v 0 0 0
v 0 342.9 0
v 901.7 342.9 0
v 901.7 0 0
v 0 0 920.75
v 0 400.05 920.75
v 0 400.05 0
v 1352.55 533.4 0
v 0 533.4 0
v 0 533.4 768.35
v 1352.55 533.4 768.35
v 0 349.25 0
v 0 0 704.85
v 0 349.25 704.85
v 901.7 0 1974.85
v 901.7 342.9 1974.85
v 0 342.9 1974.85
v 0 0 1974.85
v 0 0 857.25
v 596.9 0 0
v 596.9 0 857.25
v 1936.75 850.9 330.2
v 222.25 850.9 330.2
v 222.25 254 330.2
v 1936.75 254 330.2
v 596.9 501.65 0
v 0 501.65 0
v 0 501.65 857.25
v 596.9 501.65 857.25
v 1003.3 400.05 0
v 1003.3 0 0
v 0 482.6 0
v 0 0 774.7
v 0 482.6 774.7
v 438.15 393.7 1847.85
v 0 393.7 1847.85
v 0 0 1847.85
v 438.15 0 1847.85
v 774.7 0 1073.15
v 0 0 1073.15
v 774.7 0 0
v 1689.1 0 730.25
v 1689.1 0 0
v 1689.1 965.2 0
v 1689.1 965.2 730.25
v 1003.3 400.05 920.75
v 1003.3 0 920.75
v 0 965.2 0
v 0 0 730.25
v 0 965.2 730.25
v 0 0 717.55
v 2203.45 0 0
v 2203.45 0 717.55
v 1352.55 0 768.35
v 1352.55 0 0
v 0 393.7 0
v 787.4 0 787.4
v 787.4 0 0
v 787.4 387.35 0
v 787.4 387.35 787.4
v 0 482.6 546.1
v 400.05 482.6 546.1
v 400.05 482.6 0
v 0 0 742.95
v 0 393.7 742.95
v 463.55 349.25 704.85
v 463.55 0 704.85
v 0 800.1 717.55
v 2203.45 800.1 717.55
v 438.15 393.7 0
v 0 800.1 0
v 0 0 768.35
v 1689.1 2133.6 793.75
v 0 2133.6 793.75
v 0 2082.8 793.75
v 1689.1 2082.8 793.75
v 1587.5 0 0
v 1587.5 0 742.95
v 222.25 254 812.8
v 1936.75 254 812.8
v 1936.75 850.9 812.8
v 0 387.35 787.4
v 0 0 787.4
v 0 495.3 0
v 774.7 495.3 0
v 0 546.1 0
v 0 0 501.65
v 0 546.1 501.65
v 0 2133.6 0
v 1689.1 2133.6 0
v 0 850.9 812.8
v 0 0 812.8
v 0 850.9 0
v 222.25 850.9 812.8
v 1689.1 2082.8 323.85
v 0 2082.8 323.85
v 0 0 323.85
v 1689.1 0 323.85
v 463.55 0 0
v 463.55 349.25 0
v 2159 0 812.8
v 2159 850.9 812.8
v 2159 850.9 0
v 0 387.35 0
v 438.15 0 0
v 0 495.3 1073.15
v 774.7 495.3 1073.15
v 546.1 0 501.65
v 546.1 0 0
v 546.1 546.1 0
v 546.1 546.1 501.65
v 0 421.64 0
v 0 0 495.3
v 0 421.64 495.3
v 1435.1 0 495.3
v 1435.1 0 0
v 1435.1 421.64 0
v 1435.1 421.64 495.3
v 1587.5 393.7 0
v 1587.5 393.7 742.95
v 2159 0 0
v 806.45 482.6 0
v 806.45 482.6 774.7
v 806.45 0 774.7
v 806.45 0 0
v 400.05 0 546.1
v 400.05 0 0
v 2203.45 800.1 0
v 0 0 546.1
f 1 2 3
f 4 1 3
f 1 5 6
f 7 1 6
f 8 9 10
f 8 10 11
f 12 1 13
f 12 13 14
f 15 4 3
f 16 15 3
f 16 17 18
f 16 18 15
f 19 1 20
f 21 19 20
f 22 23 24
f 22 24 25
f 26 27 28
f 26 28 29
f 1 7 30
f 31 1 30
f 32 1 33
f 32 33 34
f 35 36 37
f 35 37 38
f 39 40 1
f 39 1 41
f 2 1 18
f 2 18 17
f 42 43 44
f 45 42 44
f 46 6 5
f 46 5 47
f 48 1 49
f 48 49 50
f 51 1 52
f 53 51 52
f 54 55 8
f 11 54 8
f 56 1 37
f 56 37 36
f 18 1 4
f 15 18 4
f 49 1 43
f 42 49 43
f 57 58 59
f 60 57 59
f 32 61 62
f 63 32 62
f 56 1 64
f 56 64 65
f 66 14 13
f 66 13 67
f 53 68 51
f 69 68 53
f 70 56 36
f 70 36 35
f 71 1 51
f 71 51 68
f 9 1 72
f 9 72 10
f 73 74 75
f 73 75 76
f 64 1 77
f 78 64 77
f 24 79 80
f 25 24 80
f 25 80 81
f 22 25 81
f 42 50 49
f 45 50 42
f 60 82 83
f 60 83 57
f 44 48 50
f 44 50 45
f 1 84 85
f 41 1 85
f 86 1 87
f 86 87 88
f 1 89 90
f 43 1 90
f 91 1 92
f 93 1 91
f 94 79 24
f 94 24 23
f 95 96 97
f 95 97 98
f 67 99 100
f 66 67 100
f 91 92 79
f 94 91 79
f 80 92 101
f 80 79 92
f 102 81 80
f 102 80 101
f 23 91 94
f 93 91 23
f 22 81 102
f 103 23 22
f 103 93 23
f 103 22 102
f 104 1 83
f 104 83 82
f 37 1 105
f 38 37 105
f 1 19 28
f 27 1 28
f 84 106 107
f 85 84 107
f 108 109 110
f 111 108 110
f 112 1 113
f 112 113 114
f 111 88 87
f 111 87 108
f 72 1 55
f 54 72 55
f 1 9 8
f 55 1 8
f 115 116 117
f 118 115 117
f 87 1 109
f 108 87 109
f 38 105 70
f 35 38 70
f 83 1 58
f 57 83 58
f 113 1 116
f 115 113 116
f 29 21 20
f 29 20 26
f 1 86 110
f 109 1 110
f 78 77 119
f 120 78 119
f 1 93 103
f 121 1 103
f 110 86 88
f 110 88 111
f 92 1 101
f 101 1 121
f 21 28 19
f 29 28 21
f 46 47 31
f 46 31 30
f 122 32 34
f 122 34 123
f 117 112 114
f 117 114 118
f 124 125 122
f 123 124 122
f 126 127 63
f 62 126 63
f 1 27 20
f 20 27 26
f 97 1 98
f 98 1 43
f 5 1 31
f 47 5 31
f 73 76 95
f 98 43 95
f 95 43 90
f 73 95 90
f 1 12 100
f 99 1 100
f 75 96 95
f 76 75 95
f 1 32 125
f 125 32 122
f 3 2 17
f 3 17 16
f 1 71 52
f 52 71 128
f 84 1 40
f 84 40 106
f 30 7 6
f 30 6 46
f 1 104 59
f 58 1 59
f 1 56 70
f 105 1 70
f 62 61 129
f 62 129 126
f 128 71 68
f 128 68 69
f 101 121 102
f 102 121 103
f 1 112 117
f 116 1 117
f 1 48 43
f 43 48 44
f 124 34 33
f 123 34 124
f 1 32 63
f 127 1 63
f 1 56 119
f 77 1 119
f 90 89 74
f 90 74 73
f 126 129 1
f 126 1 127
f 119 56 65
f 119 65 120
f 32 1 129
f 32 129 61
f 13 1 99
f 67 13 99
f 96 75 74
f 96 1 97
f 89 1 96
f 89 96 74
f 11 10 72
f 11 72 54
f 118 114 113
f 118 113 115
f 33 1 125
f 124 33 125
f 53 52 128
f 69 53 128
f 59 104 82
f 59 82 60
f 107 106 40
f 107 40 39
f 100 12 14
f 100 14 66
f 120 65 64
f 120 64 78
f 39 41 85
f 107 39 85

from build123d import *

# Parameters (mm, degrees)
F0_W      = 774.7
F0_H      = 495.3
F1_DEPTH  = 1073.15
F2_W      = 901.7
F2_H      = 342.9
F3_DEPTH  = 1974.85
F4_W      = 1689.1
F4_H      = 965.2
F5_DEPTH  = 730.25
F6_W      = 1587.5
F6_H      = 393.7
F7_DEPTH  = 742.95
F8_W      = 2159
F8_H      = 850.9
F9_DEPTH  = 812.8
F10_W     = 1714.5
F10_H     = 596.9
F11_DEPTH = 482.6
F12_W     = 1435.1
F12_H     = 421.64
F13_DEPTH = 495.3
F14_W     = 1003.3
F14_H     = 400.05
F15_DEPTH = 920.75
F16_W     = 596.9
F16_H     = 501.65
F17_DEPTH = 857.25
F18_W     = 438.15
F18_H     = 393.7
F19_DEPTH = 1847.85
F20_W     = 1689.1
F20_H     = 2133.6
F21_DEPTH = 323.85
F22_W     = 1689.1
F22_H     = 50.8
F23_DEPTH = 469.9
F24_W     = 806.45
F24_H     = 482.6
F25_DEPTH = 774.7
F26_W     = 400.05
F26_H     = 482.6
F27_DEPTH = 546.1
F28_W     = 463.55
F28_H     = 349.25
F29_DEPTH = 704.85
F30_W     = 1352.55
F30_H     = 533.4
F31_DEPTH = 768.35
F32_W     = 2203.45
F32_H     = 800.1
F33_DEPTH = 717.55
F34_W     = 787.4
F34_H     = 387.35
F35_DEPTH = 787.4
F36_W     = 546.1
F36_H     = 546.1
F37_DEPTH = 501.65


with BuildPart() as f1:
    # F0 (on Top) → F1 (new body)
    with BuildSketch(Plane.XY):
        with Locations((387.35, 247.65)):
            Rectangle(F0_W, F0_H)
    extrude(amount=F1_DEPTH)


with BuildPart() as f3:
    # F2 (on Top) → F3 (new body)
    with BuildSketch(Plane.XY):
        with Locations((450.85, 171.45)):
            Rectangle(F2_W, F2_H)
    extrude(amount=F3_DEPTH)


with BuildPart() as f5:
    # F4 (on Top) → F5 (new body)
    with BuildSketch(Plane.XY):
        with Locations((844.55, 482.6)):
            Rectangle(F4_W, F4_H)
    extrude(amount=F5_DEPTH)


with BuildPart() as f7:
    # F6 (on Top) → F7 (new body)
    with BuildSketch(Plane.XY):
        with Locations((793.75, 196.85)):
            Rectangle(F6_W, F6_H)
    extrude(amount=F7_DEPTH)


with BuildPart() as f9:
    # F8 (on Top) → F9 (new body)
    with BuildSketch(Plane.XY):
        with Locations((1079.5, 425.45)):
            Rectangle(F8_W, F8_H)
    extrude(amount=F9_DEPTH)

    # F10 (on face) → F11 (cut)
    with BuildSketch(Plane.XY.offset(812.8)):
        with Locations((1079.5, 552.45)):
            Rectangle(F10_W, F10_H)
    extrude(amount=-F11_DEPTH, mode=Mode.SUBTRACT)


with BuildPart() as f13:
    # F12 (on Top) → F13 (new body)
    with BuildSketch(Plane.XY):
        with Locations((717.55, 210.82)):
            Rectangle(F12_W, F12_H)
    extrude(amount=F13_DEPTH)


with BuildPart() as f15:
    # F14 (on Top) → F15 (new body)
    with BuildSketch(Plane.XY):
        with Locations((501.65, 200.025)):
            Rectangle(F14_W, F14_H)
    extrude(amount=F15_DEPTH)


with BuildPart() as f17:
    # F16 (on Top) → F17 (new body)
    with BuildSketch(Plane.XY):
        with Locations((298.45, 250.825)):
            Rectangle(F16_W, F16_H)
    extrude(amount=F17_DEPTH)


with BuildPart() as f19:
    # F18 (on Top) → F19 (new body)
    with BuildSketch(Plane.XY):
        with Locations((219.075, 196.85)):
            Rectangle(F18_W, F18_H)
    extrude(amount=F19_DEPTH)


with BuildPart() as f21:
    # F20 (on Top) → F21 (new body)
    with BuildSketch(Plane.XY):
        with Locations((844.55, 1066.8)):
            Rectangle(F20_W, F20_H)
    extrude(amount=F21_DEPTH)

    # F22 (on face) → F23 (join)
    with BuildSketch(Plane.XY.offset(323.85)):
        with Locations((844.55, 2108.2)):
            Rectangle(F22_W, F22_H)
    extrude(amount=F23_DEPTH)


with BuildPart() as f25:
    # F24 (on Top) → F25 (new body)
    with BuildSketch(Plane.XY):
        with Locations((403.225, 241.3)):
            Rectangle(F24_W, F24_H)
    extrude(amount=F25_DEPTH)


with BuildPart() as f27:
    # F26 (on Top) → F27 (new body)
    with BuildSketch(Plane.XY):
        with Locations((200.025, 241.3)):
            Rectangle(F26_W, F26_H)
    extrude(amount=F27_DEPTH)


with BuildPart() as f29:
    # F28 (on Top) → F29 (new body)
    with BuildSketch(Plane.XY):
        with Locations((231.775, 174.625)):
            Rectangle(F28_W, F28_H)
    extrude(amount=F29_DEPTH)


with BuildPart() as f31:
    # F30 (on Top) → F31 (new body)
    with BuildSketch(Plane.XY):
        with Locations((676.275, 266.7)):
            Rectangle(F30_W, F30_H)
    extrude(amount=F31_DEPTH)


with BuildPart() as f33:
    # F32 (on Top) → F33 (new body)
    with BuildSketch(Plane.XY):
        with Locations((1101.725, 400.05)):
            Rectangle(F32_W, F32_H)
    extrude(amount=F33_DEPTH)


with BuildPart() as f35:
    # F34 (on Top) → F35 (new body)
    with BuildSketch(Plane.XY):
        with Locations((393.7, 193.675)):
            Rectangle(F34_W, F34_H)
    extrude(amount=F35_DEPTH)


with BuildPart() as f37:
    # F36 (on Top) → F37 (new body)
    with BuildSketch(Plane.XY):
        with Locations((273.05, 273.05)):
            Rectangle(F36_W, F36_H)
    extrude(amount=F37_DEPTH)


solid = Compound([f1.part, f3.part, f5.part, f7.part, f9.part, f13.part, f15.part, f17.part, f19.part, f21.part, f25.part, f27.part, f29.part, f31.part, f33.part, f35.part, f37.part])
